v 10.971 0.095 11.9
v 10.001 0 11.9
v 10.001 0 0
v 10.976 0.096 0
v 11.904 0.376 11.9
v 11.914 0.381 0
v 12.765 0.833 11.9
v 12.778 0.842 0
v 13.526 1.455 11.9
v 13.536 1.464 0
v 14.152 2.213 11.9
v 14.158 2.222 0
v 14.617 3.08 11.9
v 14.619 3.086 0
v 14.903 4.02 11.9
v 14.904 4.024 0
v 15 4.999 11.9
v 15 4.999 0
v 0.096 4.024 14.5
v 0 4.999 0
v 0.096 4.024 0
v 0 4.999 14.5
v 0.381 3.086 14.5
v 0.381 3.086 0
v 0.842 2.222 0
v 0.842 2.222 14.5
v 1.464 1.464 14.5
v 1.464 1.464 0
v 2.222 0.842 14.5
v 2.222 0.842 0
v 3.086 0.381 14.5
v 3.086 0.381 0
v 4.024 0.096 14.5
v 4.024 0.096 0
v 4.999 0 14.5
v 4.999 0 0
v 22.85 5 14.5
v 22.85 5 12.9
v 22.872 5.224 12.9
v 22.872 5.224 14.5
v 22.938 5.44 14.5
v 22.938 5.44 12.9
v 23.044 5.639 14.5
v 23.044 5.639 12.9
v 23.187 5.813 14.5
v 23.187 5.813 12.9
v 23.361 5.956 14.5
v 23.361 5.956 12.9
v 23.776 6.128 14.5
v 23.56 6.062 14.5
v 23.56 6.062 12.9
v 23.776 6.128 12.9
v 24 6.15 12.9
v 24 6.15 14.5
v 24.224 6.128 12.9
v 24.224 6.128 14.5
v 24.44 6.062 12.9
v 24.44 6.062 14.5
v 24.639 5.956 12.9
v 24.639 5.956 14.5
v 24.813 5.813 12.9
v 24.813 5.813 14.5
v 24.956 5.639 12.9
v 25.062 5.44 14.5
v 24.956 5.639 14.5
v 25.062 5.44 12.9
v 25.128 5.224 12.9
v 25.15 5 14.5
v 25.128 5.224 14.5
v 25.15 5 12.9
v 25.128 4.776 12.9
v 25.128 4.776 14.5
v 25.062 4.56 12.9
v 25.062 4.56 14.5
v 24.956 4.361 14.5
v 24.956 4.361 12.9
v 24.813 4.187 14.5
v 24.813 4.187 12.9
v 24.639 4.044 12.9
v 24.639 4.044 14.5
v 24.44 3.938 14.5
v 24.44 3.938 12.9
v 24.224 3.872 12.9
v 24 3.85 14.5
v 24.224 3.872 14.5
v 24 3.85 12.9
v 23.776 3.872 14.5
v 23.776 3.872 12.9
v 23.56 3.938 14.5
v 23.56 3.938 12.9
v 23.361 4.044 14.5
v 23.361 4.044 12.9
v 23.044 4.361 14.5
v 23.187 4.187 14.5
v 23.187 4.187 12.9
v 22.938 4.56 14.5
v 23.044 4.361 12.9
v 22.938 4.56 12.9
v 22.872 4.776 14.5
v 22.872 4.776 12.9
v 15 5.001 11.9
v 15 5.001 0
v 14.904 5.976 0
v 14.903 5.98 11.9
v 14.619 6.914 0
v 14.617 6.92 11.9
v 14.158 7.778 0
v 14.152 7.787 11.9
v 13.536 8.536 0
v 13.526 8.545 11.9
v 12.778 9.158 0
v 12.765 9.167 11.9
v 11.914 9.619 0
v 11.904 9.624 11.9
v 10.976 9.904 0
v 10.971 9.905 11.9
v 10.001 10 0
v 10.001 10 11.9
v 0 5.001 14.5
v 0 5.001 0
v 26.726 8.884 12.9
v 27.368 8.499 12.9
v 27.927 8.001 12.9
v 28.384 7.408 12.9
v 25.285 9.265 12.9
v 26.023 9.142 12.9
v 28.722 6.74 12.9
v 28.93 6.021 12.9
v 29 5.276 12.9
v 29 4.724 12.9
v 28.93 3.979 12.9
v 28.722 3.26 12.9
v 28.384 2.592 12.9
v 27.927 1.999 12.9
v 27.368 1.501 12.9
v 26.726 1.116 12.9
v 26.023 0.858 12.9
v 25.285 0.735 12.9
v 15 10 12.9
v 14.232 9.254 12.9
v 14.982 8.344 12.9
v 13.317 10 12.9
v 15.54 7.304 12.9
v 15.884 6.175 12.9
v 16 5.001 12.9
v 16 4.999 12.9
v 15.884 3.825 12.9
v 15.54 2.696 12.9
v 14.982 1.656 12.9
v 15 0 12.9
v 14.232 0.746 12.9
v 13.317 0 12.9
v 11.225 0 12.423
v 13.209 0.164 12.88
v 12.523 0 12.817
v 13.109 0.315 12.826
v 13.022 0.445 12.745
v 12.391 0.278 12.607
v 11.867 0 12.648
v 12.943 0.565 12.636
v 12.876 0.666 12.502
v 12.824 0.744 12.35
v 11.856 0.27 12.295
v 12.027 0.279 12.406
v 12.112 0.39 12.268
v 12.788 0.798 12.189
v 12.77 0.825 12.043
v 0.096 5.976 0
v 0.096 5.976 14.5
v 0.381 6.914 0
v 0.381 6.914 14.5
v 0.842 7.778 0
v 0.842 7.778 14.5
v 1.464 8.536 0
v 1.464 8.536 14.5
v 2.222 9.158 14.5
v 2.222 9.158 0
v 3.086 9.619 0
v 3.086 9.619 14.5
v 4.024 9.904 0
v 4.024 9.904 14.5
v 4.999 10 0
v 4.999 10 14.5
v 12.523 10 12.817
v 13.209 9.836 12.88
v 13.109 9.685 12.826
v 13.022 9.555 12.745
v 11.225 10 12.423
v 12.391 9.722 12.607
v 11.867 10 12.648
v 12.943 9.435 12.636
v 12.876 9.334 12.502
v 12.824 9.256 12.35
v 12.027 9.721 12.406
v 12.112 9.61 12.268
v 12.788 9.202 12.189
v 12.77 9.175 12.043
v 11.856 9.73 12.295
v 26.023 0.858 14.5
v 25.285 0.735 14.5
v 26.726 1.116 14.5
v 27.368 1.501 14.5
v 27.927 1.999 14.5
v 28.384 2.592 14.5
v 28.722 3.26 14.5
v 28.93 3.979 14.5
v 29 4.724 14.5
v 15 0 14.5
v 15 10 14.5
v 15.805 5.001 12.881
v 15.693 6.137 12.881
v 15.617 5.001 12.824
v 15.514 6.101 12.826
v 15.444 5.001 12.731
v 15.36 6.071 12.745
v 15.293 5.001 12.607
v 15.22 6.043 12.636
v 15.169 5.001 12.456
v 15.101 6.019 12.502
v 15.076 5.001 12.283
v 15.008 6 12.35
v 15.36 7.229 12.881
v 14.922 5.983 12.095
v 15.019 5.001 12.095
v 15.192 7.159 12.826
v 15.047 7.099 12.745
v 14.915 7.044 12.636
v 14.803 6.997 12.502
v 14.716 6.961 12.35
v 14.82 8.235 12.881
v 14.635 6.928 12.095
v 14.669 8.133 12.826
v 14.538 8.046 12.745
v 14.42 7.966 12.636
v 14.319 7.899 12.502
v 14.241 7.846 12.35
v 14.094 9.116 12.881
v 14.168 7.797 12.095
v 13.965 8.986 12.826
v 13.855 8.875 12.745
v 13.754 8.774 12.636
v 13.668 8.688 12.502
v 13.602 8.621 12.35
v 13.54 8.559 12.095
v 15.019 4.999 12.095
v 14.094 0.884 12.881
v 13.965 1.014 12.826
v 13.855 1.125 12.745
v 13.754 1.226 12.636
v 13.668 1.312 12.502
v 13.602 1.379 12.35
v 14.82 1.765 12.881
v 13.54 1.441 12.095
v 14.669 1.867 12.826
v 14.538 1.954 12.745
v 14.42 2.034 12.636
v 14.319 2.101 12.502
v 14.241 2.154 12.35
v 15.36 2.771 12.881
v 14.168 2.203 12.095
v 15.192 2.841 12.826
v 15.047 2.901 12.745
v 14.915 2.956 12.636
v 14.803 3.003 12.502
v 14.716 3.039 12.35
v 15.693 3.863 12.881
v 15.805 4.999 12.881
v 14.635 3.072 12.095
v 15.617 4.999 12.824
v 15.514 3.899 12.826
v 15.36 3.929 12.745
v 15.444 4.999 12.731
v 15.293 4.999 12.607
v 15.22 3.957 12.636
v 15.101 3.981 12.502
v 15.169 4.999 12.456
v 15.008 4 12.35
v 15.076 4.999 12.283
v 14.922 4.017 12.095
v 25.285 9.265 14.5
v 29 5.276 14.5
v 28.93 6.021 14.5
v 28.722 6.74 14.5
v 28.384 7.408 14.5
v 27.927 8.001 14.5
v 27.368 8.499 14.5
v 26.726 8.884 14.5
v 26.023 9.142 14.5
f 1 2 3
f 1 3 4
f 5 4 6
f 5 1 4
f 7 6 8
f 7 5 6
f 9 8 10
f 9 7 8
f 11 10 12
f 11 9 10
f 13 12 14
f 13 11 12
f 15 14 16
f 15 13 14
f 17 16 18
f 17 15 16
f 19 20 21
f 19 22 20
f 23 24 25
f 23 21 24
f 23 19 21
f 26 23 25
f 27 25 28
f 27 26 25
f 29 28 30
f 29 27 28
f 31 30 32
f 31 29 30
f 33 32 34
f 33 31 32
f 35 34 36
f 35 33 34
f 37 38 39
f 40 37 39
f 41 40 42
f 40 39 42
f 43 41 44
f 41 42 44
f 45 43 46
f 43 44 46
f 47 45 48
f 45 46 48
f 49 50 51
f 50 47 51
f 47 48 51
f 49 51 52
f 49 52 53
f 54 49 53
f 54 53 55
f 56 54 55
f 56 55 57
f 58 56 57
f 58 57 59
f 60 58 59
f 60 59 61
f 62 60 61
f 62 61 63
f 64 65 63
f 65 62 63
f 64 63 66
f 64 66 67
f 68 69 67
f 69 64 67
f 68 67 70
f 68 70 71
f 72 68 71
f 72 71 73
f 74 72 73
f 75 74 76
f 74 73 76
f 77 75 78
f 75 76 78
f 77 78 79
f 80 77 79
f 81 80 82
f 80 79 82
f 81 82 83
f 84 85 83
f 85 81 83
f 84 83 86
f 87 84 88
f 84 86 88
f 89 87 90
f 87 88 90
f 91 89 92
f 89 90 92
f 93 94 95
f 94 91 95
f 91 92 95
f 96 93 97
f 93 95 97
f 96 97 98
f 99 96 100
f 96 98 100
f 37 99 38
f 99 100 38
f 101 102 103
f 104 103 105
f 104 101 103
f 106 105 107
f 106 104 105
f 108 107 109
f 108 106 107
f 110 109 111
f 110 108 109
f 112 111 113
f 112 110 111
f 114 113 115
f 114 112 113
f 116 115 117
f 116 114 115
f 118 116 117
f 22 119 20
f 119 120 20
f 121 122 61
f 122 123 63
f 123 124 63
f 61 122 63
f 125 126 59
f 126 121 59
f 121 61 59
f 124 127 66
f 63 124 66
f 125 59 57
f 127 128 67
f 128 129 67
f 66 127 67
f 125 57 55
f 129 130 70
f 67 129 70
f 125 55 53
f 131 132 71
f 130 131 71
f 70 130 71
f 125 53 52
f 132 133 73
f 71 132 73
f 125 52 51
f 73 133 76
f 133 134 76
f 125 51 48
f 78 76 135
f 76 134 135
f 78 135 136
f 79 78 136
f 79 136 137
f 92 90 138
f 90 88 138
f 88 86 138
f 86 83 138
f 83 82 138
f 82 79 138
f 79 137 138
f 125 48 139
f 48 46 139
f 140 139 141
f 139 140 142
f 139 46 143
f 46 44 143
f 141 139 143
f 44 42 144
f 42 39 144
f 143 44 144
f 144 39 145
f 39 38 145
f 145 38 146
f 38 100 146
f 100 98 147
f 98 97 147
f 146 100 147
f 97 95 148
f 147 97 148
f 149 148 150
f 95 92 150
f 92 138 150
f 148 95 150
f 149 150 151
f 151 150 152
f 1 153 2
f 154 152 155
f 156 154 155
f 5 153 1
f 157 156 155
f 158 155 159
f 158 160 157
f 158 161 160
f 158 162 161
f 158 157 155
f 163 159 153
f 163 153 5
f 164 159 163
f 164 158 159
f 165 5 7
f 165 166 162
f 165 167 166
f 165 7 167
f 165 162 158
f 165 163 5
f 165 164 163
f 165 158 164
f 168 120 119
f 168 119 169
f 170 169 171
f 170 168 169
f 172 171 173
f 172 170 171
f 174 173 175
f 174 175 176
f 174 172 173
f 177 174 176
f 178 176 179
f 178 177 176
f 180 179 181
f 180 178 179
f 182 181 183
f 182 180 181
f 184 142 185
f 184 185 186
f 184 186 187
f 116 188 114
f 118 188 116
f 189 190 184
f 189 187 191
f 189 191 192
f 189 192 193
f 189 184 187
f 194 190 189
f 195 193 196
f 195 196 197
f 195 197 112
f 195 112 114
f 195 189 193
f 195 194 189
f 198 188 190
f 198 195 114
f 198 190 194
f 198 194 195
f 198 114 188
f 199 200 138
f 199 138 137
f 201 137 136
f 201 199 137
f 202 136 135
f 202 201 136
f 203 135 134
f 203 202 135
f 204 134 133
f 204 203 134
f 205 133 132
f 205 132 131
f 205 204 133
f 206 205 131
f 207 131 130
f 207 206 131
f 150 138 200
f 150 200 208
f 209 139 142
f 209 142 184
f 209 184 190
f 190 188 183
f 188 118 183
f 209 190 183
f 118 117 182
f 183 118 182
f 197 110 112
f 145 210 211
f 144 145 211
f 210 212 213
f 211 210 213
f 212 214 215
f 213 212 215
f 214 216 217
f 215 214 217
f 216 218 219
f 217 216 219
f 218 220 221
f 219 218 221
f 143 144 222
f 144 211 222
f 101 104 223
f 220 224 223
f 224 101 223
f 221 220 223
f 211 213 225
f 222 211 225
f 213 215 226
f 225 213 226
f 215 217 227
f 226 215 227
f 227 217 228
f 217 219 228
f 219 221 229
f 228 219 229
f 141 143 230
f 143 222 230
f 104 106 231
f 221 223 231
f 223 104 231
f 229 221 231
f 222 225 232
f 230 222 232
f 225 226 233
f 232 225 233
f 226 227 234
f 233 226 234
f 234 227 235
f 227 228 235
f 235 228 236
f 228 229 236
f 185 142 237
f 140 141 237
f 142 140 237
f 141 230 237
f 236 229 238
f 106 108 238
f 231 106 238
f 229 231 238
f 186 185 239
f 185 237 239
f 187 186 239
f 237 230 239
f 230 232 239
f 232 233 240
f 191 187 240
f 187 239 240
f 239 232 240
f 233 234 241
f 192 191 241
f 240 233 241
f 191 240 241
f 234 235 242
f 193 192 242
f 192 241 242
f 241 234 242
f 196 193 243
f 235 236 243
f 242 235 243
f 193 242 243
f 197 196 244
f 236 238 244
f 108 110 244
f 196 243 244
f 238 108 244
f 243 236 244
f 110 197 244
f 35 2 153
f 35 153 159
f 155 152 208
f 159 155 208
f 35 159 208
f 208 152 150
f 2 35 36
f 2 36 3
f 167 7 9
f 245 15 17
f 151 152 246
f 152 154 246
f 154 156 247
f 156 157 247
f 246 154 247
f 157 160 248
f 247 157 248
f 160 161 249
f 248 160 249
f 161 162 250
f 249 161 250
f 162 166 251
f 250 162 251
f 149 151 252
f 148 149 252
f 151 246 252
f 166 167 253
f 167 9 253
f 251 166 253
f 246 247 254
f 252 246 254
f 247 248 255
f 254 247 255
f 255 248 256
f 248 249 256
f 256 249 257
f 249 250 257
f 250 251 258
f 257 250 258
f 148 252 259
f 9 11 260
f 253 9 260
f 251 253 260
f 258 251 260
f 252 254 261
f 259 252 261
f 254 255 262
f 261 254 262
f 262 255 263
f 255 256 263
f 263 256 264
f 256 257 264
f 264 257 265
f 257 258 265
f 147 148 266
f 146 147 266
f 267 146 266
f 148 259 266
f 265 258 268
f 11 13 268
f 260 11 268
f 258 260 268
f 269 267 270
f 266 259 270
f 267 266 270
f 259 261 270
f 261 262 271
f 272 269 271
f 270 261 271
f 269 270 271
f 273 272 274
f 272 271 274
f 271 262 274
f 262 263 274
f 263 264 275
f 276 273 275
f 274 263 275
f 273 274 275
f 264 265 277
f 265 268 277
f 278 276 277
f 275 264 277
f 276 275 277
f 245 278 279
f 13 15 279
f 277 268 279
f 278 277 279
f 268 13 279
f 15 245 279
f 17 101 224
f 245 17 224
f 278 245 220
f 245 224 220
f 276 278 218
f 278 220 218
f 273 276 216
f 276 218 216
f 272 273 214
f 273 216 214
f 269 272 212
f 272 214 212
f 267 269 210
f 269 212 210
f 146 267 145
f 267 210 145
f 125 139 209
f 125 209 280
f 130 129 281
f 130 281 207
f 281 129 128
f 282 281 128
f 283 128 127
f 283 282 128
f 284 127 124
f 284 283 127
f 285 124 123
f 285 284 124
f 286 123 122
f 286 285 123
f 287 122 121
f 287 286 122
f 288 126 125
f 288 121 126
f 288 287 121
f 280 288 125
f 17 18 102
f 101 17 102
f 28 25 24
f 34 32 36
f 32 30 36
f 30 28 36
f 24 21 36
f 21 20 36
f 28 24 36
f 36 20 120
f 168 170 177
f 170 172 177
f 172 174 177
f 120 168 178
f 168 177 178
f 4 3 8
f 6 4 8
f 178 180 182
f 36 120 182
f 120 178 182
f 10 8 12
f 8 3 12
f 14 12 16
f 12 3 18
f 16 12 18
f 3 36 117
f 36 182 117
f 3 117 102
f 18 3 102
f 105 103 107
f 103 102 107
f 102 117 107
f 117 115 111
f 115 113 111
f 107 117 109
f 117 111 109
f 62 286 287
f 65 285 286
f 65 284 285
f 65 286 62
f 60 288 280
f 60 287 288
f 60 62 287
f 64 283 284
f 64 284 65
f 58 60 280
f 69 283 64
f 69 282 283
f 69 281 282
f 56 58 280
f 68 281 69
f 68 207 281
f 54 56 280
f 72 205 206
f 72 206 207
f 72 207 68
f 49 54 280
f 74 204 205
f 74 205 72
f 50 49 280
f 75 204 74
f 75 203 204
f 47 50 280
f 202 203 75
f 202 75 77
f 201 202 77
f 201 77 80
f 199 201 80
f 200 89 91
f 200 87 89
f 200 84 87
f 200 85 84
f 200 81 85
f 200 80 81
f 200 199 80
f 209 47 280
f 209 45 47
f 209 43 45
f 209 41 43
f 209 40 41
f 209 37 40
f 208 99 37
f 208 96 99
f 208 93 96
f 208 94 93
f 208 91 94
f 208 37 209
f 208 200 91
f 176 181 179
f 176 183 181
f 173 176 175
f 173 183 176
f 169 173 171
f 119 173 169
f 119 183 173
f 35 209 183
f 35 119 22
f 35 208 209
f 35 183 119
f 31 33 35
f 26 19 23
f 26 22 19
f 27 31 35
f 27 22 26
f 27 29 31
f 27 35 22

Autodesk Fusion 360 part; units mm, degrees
sketch "Skizze1" plane through (0, 0, 0) normal (0, 0, 1) x (1, 0, 0)
  line L0 (0, 0) -> (15, 0)
  line L1 (15, 0) -> (15, 10)
  line L2 (15, 10) -> (0, 10)
  line L3 (0, 10) -> (0, 0)
  dimension "d1" = 15
  dimension "d2" = 10
extrude "Extrusion1" add sketch "Skizze1" along normal blind 12.9
sketch "Skizze2" plane through (0, 0, 12.9) normal (0, 0, 1) x (-1, 0, 0)
  line L0 (0, -10) -> (0, 0)
  line L1 (0, 0) -> (-15, 0)
  line L2 (-15, 0) -> (-15, -10)
  line L3 (-15, -10) -> (0, -10)
  circle A0 centre (-24, -5) radius 1.15
  line L4 (0, -10) -> (-15, -10)
  line L5 (-15, -10) -> (-29, -9)
  line L6 (-29, -9) -> (-29, -1)
  line L7 (-29, -1) -> (-15, 0)
  dimension "Bohrung" = 2.3
  dimension "d8" = 8
  dimension "d9" = 1
  dimension "d12" = 5
  dimension "d21" = 4
  dimension "d22" = 10
extrude "Extrusion2" add sketch "Skizze2" along normal blind 1.6
fillet "Abrundung1" radius 4 2 edges at (29, 9, 13.7) (29, 1, 13.7)
fillet "Abrundung2" radius 5 4 edges at (15, 10, 6.45) (15, 0, 6.45) (0, 0, 7.25) (0, 10, 7.25)
fillet "Abrundung3" radius 1 1 edges at (15, 5, 12.9)
equation "Abstand_Sensor = 12.9 mm" comment "Hier lässt sich die Länge des Abstandshalters einstellen. (Gemessen von Unterkante Abstandshalter bis Rückseite Sensor)  Here you can adjust the length of the spacer. (Measured form bottom ede of the spacher to the backside of the sensor PCB)"
equation "Bohrung = 2.3 mm" comment "Hier lässt sich der Durchmesser für das Schraubloch einstellen.  Here you can adjust the diameter of the hole for the M2 screw."
equation "Länge_Arm = 29 mm" comment "Hier lässt sich die Länge des Arms einstellen an dem der Sensor angeschraubt wird. Here you can adjust the length of the arm on which the sensor is screwed."
equation "Armdicke = 1.6 mm" comment "Ich habe den Arm genau so dick gemacht wie das PCB des Sensors."
